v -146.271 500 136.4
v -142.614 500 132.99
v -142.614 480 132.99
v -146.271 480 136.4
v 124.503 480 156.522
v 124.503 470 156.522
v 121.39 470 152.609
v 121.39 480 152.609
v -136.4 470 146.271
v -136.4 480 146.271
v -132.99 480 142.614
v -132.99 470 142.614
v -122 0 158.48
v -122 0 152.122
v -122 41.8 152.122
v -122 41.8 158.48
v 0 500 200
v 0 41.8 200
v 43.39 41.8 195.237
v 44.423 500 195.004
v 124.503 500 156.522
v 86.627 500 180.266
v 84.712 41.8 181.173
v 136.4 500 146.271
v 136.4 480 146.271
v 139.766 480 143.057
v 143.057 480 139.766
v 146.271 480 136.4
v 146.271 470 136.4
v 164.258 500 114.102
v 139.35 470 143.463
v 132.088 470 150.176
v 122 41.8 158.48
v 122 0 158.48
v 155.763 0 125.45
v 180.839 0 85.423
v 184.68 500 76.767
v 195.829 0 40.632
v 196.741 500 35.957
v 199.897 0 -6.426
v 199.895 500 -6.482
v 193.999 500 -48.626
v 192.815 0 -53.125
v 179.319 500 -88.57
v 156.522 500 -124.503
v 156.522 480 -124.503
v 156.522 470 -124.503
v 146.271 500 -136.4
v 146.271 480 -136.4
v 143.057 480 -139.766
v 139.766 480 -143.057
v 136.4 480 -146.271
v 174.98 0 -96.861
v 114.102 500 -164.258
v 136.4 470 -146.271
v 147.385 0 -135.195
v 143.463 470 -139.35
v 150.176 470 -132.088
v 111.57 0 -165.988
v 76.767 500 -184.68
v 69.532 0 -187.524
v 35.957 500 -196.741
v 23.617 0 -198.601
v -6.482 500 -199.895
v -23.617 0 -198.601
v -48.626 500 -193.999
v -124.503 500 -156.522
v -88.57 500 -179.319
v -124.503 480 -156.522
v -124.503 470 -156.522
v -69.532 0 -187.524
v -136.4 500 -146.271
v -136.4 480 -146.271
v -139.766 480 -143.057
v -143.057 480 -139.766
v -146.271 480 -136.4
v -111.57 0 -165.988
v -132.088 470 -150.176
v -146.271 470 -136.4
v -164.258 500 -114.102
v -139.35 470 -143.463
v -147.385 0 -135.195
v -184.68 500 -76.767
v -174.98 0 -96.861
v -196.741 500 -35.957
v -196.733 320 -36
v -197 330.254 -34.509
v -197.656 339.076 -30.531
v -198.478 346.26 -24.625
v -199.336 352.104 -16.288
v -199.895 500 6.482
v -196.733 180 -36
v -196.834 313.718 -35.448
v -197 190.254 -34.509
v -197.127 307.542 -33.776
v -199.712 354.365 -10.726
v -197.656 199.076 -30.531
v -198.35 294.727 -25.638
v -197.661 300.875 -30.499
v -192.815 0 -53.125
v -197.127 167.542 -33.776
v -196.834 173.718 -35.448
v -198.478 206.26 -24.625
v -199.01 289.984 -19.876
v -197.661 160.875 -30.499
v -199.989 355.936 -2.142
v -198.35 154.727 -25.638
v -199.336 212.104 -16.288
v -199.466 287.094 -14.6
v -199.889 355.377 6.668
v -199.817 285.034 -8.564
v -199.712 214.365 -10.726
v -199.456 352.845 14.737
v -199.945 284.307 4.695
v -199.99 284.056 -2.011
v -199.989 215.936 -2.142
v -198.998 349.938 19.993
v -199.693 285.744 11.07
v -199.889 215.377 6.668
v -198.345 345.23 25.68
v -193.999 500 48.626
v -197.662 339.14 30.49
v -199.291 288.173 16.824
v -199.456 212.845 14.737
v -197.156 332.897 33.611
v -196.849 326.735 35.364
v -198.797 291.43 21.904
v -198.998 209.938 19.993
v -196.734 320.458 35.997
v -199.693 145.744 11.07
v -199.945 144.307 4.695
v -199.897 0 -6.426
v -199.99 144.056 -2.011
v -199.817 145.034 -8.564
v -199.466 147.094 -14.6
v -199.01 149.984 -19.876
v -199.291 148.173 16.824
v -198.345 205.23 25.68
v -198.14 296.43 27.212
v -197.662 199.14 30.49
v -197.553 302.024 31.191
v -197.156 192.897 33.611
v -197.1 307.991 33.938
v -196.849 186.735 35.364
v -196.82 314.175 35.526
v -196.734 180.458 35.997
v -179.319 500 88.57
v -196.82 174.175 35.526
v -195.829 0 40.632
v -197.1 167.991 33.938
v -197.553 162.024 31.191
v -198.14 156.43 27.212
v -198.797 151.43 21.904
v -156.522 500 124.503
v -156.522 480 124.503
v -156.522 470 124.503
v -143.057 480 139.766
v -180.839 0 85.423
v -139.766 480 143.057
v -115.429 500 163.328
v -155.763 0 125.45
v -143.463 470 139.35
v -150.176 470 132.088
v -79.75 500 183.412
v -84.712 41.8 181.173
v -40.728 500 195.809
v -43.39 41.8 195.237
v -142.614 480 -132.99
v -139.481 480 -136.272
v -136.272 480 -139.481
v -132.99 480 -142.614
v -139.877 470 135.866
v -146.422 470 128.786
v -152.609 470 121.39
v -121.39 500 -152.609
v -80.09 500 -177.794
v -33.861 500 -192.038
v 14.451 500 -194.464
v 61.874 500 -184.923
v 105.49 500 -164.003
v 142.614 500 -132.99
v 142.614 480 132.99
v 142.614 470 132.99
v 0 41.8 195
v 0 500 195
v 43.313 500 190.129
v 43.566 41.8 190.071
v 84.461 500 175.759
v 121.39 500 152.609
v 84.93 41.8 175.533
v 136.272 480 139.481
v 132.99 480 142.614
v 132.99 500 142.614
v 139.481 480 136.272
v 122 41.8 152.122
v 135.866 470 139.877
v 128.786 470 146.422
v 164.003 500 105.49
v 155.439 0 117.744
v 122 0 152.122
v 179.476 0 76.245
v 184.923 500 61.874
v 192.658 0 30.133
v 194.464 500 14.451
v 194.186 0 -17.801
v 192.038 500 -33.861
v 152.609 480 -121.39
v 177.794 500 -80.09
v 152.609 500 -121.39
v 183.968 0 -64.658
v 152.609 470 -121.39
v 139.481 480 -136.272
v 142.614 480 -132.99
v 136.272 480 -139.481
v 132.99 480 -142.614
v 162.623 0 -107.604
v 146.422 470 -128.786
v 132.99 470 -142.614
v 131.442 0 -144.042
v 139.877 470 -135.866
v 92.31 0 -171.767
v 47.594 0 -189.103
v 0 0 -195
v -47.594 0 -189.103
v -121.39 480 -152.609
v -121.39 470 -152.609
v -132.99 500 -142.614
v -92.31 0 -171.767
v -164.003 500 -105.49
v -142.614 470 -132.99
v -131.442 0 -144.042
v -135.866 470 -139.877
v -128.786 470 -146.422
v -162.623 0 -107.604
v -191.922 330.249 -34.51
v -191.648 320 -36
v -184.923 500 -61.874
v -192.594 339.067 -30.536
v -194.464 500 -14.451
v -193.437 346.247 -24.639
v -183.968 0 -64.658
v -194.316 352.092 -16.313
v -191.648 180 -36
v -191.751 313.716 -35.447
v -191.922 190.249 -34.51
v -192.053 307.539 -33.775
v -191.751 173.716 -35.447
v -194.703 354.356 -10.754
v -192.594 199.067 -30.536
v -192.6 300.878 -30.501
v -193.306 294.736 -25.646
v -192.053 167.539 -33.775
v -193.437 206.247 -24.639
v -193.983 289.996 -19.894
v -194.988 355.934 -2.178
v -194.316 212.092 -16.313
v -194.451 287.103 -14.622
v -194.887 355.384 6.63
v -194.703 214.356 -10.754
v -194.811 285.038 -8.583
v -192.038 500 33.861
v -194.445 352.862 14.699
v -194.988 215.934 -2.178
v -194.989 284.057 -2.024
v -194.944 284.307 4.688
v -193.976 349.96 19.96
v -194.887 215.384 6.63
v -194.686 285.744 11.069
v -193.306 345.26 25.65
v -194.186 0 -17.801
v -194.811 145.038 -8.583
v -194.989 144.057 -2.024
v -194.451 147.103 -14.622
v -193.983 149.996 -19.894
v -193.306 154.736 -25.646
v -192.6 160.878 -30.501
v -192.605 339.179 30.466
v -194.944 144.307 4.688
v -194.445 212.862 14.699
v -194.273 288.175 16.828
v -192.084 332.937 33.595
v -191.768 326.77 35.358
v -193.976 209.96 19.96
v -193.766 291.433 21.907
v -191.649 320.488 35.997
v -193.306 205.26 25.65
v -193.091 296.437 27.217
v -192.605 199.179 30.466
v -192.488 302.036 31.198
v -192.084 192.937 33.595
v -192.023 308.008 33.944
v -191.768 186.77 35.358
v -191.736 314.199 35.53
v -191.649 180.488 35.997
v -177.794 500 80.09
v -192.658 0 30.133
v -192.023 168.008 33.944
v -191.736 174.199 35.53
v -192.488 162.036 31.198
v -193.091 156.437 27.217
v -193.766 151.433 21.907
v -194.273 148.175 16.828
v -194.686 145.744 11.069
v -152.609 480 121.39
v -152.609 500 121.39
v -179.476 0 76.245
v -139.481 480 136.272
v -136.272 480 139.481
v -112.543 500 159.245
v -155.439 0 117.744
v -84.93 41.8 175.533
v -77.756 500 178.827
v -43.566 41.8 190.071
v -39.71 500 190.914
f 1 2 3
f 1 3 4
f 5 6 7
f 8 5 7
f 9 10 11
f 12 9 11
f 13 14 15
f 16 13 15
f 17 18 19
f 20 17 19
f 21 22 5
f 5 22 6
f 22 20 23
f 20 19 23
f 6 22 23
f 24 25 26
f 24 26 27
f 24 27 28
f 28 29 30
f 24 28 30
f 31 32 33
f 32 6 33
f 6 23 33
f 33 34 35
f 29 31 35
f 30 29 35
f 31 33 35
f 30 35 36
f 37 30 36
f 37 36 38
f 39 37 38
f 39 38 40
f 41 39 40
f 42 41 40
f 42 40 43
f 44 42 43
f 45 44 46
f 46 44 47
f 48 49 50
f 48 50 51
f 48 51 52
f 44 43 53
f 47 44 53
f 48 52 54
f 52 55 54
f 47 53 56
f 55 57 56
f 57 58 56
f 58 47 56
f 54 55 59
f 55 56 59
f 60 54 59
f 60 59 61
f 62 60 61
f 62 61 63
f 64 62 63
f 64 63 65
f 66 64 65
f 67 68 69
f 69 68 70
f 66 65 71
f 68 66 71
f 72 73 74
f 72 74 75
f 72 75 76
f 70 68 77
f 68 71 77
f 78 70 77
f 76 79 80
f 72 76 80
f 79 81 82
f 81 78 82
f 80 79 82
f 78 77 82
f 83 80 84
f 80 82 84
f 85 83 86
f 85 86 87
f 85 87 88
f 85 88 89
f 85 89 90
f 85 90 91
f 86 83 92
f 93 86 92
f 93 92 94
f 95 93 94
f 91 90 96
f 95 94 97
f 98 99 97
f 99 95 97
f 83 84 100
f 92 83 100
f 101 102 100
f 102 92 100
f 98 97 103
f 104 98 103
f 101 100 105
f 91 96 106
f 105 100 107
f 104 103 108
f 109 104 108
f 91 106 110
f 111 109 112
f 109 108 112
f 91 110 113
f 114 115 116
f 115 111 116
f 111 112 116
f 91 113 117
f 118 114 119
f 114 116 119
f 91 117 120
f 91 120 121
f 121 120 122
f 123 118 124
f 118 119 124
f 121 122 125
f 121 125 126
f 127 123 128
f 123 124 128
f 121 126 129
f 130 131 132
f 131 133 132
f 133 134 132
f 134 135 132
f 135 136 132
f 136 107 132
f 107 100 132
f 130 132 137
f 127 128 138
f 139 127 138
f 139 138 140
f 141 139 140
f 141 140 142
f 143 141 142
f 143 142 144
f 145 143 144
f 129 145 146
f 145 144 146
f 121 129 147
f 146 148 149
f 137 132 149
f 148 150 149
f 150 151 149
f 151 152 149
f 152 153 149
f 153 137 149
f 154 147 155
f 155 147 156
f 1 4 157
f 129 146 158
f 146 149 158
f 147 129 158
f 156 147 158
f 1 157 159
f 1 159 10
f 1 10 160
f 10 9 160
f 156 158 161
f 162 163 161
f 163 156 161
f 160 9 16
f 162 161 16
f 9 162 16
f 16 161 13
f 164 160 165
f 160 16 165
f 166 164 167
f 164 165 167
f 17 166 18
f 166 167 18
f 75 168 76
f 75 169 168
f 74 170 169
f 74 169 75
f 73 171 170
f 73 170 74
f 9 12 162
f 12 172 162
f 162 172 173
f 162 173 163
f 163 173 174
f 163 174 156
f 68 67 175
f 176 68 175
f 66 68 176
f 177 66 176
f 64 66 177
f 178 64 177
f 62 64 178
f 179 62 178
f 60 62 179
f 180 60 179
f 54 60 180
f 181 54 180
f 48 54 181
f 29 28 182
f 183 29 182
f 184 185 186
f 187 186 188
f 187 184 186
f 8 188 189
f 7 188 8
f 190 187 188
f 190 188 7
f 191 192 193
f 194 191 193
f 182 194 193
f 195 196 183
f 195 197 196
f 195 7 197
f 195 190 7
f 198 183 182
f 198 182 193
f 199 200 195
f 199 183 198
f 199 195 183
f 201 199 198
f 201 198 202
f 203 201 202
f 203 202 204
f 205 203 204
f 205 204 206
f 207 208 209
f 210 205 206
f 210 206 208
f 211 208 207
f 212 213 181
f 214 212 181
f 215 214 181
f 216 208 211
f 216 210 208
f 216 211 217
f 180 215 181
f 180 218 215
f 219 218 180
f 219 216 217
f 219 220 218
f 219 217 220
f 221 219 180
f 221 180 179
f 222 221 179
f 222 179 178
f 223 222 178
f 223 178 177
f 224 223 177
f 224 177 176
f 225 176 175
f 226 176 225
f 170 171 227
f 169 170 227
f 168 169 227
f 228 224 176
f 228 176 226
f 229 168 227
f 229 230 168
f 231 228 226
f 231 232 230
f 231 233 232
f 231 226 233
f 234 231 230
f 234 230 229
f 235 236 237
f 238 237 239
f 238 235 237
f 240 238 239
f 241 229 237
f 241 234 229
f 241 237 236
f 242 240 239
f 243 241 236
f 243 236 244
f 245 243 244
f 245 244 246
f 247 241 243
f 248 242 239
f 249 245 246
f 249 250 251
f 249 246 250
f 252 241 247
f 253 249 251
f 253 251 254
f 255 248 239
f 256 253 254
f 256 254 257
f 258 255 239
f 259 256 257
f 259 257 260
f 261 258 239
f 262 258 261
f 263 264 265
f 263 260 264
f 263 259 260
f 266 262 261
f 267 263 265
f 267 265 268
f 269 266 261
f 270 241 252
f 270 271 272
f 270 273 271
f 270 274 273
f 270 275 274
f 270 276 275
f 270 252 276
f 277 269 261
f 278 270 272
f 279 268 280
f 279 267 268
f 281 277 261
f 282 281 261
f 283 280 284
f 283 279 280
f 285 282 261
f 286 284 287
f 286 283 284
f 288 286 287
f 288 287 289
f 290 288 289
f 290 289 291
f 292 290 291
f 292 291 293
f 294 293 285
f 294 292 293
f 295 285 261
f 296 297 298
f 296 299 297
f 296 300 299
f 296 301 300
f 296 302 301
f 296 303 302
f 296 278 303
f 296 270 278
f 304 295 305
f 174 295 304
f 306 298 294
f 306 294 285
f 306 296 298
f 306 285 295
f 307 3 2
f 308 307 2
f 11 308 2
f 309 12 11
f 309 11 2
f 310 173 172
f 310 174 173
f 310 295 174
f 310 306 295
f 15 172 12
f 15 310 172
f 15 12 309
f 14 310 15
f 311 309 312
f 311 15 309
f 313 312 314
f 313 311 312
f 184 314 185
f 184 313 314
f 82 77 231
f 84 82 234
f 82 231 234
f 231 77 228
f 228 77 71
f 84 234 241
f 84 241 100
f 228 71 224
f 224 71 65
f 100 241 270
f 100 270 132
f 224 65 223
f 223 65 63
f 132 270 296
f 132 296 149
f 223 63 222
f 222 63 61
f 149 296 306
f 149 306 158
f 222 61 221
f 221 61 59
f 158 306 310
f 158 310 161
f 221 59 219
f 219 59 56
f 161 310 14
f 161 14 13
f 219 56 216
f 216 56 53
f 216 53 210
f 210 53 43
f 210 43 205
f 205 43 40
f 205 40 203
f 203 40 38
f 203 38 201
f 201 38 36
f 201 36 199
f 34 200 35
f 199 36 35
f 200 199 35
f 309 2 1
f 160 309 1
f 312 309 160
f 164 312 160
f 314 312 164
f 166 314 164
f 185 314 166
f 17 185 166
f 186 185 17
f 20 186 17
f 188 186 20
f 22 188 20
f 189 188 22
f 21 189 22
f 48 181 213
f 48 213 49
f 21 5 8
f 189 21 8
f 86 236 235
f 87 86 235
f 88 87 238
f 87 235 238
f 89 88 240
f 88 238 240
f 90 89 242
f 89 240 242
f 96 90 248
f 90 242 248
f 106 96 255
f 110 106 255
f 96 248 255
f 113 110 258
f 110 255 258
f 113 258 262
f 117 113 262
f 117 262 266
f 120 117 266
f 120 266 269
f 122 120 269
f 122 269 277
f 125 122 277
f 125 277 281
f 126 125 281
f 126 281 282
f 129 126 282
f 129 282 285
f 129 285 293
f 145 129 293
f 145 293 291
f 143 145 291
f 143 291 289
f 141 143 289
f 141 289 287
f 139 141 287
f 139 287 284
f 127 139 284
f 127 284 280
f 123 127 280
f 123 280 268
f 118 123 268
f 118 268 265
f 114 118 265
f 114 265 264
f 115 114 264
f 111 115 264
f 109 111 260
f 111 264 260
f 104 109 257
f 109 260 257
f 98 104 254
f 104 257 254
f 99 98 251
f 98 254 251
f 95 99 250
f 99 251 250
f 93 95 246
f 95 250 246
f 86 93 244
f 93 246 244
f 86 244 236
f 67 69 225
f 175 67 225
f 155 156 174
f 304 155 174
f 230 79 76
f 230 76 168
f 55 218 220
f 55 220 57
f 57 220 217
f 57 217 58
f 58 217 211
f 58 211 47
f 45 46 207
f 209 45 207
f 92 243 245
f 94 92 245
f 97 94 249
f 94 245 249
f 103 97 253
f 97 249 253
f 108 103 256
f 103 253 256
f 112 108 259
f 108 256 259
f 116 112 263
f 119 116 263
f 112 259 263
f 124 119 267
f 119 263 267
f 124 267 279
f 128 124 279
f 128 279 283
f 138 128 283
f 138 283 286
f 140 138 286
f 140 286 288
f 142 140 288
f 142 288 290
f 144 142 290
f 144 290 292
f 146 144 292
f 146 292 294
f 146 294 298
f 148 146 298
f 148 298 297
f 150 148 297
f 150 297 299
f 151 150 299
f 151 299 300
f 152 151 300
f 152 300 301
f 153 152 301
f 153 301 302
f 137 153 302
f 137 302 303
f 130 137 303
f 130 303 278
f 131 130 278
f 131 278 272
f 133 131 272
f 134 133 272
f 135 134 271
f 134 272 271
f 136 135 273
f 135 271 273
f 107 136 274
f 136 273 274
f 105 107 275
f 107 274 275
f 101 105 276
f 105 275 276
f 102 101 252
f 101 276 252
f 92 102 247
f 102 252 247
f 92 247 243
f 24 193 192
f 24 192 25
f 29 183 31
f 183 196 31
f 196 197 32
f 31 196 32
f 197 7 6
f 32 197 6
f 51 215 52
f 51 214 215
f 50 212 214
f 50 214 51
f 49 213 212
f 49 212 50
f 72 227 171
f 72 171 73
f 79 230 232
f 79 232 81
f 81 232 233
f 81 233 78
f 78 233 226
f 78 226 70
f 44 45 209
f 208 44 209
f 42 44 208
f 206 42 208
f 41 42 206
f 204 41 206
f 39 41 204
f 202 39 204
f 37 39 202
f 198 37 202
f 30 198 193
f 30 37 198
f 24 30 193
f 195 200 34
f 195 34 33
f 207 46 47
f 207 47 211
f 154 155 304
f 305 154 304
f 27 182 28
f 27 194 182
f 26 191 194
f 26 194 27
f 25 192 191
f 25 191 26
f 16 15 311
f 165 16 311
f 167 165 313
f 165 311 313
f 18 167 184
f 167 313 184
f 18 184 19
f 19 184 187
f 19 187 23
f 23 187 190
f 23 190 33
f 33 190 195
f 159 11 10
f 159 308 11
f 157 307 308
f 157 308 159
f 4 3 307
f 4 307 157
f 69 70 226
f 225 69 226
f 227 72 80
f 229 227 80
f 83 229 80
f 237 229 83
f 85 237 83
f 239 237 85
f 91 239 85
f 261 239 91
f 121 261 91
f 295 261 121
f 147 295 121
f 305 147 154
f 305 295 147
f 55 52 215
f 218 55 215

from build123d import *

# Parameters (mm, degrees)
SKETCH_1_R                  = 200
SKETCH_1_R_2                = 195
EXTRUDE_339_DEPTH           = 500
CUT_EXTRUDE_START           = -127.878338
SKETCH_8_W                  = 244
SKETCH_8_H                  = 41.8
CUT_EXTRUDE_600_DEPTH       = 47.878338
SKETCH_9_R                  = 36
CUT_EXTRUDE_1494_DEPTH      = 575.456264654
CUT_EXTRUDE_1675_REACH      = 576.456
CUT_EXTRUDE_1675_END_RADIUS = 200
SKETCH_10_R                 = 36
SKETCH_14_W                 = 24.14269203
SKETCH_14_H                 = 10
CUT_REVOLVE_1_ANGLE         = 8.5
CUT_EXTRUDE_1_REACH         = 559.136
PATTERN_CIRCULAR_1_COUNT    = 4


with BuildPart() as part:
    # 草图1 → Extrude 339 (new body)
    with BuildSketch(Plane(origin=(0, 0, 0), x_dir=(1, 0, 0), z_dir=(0, 1, 0))):
        with Locations(Location((0, 0, 0), (0, 0, 270))):
            Circle(SKETCH_1_R)
        with Locations(Location((0, 0, 0), (0, 0, 270))):
            Circle(SKETCH_1_R_2, mode=Mode.SUBTRACT)
    extrude(amount=EXTRUDE_339_DEPTH)

    # 草图8 → Cut-Extrude 600 (cut)
    with BuildSketch(Plane.XY.offset(280).offset(CUT_EXTRUDE_START)):
        with Locations((0, 20.9)):
            Rectangle(SKETCH_8_W, SKETCH_8_H)
    extrude(amount=CUT_EXTRUDE_600_DEPTH, mode=Mode.SUBTRACT)

    # 草图9 → Cut-Extrude 1494 (cut, through all)
    with BuildSketch(Plane(origin=(0, 0, 0), x_dir=(0, 0, -1), z_dir=(1, 0, 0))):
        with Locations((0, 180)):
            Circle(SKETCH_9_R)
    extrude(amount=-CUT_EXTRUDE_1494_DEPTH, mode=Mode.SUBTRACT)

    # Cut-Extrude 1675: up to this cylinder (the profile starts inside it)
    cut_extrude_1675_end = Plane(origin=(0, 320, 0), z_dir=(0, -1, 0)) * Cylinder(CUT_EXTRUDE_1675_END_RADIUS, 1553.912, mode=Mode.PRIVATE)
    # 草图10 → Cut-Extrude 1675 (cut, up to the surface)
    with BuildSketch(Plane(origin=(0, 0, 0), x_dir=(0, 0, -1), z_dir=(1, 0, 0)), mode=Mode.PRIVATE) as cut_extrude_1675_sk1:
        with Locations((0, 320)):
            Circle(SKETCH_10_R)
    cut_extrude_1675_tool1 = extrude(cut_extrude_1675_sk1.sketch, amount=-CUT_EXTRUDE_1675_REACH, mode=Mode.PRIVATE) & cut_extrude_1675_end
    add(cut_extrude_1675_tool1.solids().sort_by_distance((0, 320, 0))[0], mode=Mode.SUBTRACT)

    # 草图14 → 切除-旋转1 (revolve, cut)
    with BuildSketch(Plane(origin=(0, 0, 0), x_dir=(0.7313537016191752, 0, 0.6819983600624934), z_dir=(-0.6819983600624934, 0, 0.7313537016191752))):
        with Locations((-187.928653985, 475)):
            Rectangle(SKETCH_14_W, SKETCH_14_H)
    cut_revolve_1 = revolve(axis=Axis((0, -25.014655285, 0), (0, -1, 0)), revolution_arc=CUT_REVOLVE_1_ANGLE, mode=Mode.SUBTRACT)

    # 草图16 → 切除-拉伸1 (cut, up to next)
    with BuildSketch(Plane.XZ.offset(-480), mode=Mode.PRIVATE) as cut_extrude_1_sk1:
        with BuildLine():
            Line((-124.502927328, -156.52163137), (-121.390354144, -152.608590586))
            ThreePointArc((-121.390354144, -152.608590586), (-127.28815173, -147.725171955), (-132.989680212, -142.613971816))
            Line((-132.989680212, -142.613971816), (-136.399672013, -146.270740324))
            ThreePointArc((-136.399672013, -146.270740324), (-130.551950493, -151.512996877), (-124.502927328, -156.52163137))
        make_face()
    cut_extrude_1_tool1 = extrude(cut_extrude_1_sk1.sketch, amount=-CUT_EXTRUDE_1_REACH, mode=Mode.PRIVATE) & part.part
    cut_extrude_1 = cut_extrude_1_tool1.solids().sort_by_distance((-128.893802, 480, -149.588621))[0]
    add(cut_extrude_1, mode=Mode.SUBTRACT)

    # 阵列(圆周)1: 切除-旋转1, 切除-拉伸1 ×4 about axis
    pattern_circular_1_axis = Axis((0, -25.014655285, 0), (0, 1, 0))
    add([cut_revolve_1.rotate(pattern_circular_1_axis, i * 360 / PATTERN_CIRCULAR_1_COUNT) for i in range(1, PATTERN_CIRCULAR_1_COUNT)], mode=Mode.SUBTRACT)
    add([cut_extrude_1.rotate(pattern_circular_1_axis, i * 360 / PATTERN_CIRCULAR_1_COUNT) for i in range(1, PATTERN_CIRCULAR_1_COUNT)], mode=Mode.SUBTRACT)


solid = part.part
